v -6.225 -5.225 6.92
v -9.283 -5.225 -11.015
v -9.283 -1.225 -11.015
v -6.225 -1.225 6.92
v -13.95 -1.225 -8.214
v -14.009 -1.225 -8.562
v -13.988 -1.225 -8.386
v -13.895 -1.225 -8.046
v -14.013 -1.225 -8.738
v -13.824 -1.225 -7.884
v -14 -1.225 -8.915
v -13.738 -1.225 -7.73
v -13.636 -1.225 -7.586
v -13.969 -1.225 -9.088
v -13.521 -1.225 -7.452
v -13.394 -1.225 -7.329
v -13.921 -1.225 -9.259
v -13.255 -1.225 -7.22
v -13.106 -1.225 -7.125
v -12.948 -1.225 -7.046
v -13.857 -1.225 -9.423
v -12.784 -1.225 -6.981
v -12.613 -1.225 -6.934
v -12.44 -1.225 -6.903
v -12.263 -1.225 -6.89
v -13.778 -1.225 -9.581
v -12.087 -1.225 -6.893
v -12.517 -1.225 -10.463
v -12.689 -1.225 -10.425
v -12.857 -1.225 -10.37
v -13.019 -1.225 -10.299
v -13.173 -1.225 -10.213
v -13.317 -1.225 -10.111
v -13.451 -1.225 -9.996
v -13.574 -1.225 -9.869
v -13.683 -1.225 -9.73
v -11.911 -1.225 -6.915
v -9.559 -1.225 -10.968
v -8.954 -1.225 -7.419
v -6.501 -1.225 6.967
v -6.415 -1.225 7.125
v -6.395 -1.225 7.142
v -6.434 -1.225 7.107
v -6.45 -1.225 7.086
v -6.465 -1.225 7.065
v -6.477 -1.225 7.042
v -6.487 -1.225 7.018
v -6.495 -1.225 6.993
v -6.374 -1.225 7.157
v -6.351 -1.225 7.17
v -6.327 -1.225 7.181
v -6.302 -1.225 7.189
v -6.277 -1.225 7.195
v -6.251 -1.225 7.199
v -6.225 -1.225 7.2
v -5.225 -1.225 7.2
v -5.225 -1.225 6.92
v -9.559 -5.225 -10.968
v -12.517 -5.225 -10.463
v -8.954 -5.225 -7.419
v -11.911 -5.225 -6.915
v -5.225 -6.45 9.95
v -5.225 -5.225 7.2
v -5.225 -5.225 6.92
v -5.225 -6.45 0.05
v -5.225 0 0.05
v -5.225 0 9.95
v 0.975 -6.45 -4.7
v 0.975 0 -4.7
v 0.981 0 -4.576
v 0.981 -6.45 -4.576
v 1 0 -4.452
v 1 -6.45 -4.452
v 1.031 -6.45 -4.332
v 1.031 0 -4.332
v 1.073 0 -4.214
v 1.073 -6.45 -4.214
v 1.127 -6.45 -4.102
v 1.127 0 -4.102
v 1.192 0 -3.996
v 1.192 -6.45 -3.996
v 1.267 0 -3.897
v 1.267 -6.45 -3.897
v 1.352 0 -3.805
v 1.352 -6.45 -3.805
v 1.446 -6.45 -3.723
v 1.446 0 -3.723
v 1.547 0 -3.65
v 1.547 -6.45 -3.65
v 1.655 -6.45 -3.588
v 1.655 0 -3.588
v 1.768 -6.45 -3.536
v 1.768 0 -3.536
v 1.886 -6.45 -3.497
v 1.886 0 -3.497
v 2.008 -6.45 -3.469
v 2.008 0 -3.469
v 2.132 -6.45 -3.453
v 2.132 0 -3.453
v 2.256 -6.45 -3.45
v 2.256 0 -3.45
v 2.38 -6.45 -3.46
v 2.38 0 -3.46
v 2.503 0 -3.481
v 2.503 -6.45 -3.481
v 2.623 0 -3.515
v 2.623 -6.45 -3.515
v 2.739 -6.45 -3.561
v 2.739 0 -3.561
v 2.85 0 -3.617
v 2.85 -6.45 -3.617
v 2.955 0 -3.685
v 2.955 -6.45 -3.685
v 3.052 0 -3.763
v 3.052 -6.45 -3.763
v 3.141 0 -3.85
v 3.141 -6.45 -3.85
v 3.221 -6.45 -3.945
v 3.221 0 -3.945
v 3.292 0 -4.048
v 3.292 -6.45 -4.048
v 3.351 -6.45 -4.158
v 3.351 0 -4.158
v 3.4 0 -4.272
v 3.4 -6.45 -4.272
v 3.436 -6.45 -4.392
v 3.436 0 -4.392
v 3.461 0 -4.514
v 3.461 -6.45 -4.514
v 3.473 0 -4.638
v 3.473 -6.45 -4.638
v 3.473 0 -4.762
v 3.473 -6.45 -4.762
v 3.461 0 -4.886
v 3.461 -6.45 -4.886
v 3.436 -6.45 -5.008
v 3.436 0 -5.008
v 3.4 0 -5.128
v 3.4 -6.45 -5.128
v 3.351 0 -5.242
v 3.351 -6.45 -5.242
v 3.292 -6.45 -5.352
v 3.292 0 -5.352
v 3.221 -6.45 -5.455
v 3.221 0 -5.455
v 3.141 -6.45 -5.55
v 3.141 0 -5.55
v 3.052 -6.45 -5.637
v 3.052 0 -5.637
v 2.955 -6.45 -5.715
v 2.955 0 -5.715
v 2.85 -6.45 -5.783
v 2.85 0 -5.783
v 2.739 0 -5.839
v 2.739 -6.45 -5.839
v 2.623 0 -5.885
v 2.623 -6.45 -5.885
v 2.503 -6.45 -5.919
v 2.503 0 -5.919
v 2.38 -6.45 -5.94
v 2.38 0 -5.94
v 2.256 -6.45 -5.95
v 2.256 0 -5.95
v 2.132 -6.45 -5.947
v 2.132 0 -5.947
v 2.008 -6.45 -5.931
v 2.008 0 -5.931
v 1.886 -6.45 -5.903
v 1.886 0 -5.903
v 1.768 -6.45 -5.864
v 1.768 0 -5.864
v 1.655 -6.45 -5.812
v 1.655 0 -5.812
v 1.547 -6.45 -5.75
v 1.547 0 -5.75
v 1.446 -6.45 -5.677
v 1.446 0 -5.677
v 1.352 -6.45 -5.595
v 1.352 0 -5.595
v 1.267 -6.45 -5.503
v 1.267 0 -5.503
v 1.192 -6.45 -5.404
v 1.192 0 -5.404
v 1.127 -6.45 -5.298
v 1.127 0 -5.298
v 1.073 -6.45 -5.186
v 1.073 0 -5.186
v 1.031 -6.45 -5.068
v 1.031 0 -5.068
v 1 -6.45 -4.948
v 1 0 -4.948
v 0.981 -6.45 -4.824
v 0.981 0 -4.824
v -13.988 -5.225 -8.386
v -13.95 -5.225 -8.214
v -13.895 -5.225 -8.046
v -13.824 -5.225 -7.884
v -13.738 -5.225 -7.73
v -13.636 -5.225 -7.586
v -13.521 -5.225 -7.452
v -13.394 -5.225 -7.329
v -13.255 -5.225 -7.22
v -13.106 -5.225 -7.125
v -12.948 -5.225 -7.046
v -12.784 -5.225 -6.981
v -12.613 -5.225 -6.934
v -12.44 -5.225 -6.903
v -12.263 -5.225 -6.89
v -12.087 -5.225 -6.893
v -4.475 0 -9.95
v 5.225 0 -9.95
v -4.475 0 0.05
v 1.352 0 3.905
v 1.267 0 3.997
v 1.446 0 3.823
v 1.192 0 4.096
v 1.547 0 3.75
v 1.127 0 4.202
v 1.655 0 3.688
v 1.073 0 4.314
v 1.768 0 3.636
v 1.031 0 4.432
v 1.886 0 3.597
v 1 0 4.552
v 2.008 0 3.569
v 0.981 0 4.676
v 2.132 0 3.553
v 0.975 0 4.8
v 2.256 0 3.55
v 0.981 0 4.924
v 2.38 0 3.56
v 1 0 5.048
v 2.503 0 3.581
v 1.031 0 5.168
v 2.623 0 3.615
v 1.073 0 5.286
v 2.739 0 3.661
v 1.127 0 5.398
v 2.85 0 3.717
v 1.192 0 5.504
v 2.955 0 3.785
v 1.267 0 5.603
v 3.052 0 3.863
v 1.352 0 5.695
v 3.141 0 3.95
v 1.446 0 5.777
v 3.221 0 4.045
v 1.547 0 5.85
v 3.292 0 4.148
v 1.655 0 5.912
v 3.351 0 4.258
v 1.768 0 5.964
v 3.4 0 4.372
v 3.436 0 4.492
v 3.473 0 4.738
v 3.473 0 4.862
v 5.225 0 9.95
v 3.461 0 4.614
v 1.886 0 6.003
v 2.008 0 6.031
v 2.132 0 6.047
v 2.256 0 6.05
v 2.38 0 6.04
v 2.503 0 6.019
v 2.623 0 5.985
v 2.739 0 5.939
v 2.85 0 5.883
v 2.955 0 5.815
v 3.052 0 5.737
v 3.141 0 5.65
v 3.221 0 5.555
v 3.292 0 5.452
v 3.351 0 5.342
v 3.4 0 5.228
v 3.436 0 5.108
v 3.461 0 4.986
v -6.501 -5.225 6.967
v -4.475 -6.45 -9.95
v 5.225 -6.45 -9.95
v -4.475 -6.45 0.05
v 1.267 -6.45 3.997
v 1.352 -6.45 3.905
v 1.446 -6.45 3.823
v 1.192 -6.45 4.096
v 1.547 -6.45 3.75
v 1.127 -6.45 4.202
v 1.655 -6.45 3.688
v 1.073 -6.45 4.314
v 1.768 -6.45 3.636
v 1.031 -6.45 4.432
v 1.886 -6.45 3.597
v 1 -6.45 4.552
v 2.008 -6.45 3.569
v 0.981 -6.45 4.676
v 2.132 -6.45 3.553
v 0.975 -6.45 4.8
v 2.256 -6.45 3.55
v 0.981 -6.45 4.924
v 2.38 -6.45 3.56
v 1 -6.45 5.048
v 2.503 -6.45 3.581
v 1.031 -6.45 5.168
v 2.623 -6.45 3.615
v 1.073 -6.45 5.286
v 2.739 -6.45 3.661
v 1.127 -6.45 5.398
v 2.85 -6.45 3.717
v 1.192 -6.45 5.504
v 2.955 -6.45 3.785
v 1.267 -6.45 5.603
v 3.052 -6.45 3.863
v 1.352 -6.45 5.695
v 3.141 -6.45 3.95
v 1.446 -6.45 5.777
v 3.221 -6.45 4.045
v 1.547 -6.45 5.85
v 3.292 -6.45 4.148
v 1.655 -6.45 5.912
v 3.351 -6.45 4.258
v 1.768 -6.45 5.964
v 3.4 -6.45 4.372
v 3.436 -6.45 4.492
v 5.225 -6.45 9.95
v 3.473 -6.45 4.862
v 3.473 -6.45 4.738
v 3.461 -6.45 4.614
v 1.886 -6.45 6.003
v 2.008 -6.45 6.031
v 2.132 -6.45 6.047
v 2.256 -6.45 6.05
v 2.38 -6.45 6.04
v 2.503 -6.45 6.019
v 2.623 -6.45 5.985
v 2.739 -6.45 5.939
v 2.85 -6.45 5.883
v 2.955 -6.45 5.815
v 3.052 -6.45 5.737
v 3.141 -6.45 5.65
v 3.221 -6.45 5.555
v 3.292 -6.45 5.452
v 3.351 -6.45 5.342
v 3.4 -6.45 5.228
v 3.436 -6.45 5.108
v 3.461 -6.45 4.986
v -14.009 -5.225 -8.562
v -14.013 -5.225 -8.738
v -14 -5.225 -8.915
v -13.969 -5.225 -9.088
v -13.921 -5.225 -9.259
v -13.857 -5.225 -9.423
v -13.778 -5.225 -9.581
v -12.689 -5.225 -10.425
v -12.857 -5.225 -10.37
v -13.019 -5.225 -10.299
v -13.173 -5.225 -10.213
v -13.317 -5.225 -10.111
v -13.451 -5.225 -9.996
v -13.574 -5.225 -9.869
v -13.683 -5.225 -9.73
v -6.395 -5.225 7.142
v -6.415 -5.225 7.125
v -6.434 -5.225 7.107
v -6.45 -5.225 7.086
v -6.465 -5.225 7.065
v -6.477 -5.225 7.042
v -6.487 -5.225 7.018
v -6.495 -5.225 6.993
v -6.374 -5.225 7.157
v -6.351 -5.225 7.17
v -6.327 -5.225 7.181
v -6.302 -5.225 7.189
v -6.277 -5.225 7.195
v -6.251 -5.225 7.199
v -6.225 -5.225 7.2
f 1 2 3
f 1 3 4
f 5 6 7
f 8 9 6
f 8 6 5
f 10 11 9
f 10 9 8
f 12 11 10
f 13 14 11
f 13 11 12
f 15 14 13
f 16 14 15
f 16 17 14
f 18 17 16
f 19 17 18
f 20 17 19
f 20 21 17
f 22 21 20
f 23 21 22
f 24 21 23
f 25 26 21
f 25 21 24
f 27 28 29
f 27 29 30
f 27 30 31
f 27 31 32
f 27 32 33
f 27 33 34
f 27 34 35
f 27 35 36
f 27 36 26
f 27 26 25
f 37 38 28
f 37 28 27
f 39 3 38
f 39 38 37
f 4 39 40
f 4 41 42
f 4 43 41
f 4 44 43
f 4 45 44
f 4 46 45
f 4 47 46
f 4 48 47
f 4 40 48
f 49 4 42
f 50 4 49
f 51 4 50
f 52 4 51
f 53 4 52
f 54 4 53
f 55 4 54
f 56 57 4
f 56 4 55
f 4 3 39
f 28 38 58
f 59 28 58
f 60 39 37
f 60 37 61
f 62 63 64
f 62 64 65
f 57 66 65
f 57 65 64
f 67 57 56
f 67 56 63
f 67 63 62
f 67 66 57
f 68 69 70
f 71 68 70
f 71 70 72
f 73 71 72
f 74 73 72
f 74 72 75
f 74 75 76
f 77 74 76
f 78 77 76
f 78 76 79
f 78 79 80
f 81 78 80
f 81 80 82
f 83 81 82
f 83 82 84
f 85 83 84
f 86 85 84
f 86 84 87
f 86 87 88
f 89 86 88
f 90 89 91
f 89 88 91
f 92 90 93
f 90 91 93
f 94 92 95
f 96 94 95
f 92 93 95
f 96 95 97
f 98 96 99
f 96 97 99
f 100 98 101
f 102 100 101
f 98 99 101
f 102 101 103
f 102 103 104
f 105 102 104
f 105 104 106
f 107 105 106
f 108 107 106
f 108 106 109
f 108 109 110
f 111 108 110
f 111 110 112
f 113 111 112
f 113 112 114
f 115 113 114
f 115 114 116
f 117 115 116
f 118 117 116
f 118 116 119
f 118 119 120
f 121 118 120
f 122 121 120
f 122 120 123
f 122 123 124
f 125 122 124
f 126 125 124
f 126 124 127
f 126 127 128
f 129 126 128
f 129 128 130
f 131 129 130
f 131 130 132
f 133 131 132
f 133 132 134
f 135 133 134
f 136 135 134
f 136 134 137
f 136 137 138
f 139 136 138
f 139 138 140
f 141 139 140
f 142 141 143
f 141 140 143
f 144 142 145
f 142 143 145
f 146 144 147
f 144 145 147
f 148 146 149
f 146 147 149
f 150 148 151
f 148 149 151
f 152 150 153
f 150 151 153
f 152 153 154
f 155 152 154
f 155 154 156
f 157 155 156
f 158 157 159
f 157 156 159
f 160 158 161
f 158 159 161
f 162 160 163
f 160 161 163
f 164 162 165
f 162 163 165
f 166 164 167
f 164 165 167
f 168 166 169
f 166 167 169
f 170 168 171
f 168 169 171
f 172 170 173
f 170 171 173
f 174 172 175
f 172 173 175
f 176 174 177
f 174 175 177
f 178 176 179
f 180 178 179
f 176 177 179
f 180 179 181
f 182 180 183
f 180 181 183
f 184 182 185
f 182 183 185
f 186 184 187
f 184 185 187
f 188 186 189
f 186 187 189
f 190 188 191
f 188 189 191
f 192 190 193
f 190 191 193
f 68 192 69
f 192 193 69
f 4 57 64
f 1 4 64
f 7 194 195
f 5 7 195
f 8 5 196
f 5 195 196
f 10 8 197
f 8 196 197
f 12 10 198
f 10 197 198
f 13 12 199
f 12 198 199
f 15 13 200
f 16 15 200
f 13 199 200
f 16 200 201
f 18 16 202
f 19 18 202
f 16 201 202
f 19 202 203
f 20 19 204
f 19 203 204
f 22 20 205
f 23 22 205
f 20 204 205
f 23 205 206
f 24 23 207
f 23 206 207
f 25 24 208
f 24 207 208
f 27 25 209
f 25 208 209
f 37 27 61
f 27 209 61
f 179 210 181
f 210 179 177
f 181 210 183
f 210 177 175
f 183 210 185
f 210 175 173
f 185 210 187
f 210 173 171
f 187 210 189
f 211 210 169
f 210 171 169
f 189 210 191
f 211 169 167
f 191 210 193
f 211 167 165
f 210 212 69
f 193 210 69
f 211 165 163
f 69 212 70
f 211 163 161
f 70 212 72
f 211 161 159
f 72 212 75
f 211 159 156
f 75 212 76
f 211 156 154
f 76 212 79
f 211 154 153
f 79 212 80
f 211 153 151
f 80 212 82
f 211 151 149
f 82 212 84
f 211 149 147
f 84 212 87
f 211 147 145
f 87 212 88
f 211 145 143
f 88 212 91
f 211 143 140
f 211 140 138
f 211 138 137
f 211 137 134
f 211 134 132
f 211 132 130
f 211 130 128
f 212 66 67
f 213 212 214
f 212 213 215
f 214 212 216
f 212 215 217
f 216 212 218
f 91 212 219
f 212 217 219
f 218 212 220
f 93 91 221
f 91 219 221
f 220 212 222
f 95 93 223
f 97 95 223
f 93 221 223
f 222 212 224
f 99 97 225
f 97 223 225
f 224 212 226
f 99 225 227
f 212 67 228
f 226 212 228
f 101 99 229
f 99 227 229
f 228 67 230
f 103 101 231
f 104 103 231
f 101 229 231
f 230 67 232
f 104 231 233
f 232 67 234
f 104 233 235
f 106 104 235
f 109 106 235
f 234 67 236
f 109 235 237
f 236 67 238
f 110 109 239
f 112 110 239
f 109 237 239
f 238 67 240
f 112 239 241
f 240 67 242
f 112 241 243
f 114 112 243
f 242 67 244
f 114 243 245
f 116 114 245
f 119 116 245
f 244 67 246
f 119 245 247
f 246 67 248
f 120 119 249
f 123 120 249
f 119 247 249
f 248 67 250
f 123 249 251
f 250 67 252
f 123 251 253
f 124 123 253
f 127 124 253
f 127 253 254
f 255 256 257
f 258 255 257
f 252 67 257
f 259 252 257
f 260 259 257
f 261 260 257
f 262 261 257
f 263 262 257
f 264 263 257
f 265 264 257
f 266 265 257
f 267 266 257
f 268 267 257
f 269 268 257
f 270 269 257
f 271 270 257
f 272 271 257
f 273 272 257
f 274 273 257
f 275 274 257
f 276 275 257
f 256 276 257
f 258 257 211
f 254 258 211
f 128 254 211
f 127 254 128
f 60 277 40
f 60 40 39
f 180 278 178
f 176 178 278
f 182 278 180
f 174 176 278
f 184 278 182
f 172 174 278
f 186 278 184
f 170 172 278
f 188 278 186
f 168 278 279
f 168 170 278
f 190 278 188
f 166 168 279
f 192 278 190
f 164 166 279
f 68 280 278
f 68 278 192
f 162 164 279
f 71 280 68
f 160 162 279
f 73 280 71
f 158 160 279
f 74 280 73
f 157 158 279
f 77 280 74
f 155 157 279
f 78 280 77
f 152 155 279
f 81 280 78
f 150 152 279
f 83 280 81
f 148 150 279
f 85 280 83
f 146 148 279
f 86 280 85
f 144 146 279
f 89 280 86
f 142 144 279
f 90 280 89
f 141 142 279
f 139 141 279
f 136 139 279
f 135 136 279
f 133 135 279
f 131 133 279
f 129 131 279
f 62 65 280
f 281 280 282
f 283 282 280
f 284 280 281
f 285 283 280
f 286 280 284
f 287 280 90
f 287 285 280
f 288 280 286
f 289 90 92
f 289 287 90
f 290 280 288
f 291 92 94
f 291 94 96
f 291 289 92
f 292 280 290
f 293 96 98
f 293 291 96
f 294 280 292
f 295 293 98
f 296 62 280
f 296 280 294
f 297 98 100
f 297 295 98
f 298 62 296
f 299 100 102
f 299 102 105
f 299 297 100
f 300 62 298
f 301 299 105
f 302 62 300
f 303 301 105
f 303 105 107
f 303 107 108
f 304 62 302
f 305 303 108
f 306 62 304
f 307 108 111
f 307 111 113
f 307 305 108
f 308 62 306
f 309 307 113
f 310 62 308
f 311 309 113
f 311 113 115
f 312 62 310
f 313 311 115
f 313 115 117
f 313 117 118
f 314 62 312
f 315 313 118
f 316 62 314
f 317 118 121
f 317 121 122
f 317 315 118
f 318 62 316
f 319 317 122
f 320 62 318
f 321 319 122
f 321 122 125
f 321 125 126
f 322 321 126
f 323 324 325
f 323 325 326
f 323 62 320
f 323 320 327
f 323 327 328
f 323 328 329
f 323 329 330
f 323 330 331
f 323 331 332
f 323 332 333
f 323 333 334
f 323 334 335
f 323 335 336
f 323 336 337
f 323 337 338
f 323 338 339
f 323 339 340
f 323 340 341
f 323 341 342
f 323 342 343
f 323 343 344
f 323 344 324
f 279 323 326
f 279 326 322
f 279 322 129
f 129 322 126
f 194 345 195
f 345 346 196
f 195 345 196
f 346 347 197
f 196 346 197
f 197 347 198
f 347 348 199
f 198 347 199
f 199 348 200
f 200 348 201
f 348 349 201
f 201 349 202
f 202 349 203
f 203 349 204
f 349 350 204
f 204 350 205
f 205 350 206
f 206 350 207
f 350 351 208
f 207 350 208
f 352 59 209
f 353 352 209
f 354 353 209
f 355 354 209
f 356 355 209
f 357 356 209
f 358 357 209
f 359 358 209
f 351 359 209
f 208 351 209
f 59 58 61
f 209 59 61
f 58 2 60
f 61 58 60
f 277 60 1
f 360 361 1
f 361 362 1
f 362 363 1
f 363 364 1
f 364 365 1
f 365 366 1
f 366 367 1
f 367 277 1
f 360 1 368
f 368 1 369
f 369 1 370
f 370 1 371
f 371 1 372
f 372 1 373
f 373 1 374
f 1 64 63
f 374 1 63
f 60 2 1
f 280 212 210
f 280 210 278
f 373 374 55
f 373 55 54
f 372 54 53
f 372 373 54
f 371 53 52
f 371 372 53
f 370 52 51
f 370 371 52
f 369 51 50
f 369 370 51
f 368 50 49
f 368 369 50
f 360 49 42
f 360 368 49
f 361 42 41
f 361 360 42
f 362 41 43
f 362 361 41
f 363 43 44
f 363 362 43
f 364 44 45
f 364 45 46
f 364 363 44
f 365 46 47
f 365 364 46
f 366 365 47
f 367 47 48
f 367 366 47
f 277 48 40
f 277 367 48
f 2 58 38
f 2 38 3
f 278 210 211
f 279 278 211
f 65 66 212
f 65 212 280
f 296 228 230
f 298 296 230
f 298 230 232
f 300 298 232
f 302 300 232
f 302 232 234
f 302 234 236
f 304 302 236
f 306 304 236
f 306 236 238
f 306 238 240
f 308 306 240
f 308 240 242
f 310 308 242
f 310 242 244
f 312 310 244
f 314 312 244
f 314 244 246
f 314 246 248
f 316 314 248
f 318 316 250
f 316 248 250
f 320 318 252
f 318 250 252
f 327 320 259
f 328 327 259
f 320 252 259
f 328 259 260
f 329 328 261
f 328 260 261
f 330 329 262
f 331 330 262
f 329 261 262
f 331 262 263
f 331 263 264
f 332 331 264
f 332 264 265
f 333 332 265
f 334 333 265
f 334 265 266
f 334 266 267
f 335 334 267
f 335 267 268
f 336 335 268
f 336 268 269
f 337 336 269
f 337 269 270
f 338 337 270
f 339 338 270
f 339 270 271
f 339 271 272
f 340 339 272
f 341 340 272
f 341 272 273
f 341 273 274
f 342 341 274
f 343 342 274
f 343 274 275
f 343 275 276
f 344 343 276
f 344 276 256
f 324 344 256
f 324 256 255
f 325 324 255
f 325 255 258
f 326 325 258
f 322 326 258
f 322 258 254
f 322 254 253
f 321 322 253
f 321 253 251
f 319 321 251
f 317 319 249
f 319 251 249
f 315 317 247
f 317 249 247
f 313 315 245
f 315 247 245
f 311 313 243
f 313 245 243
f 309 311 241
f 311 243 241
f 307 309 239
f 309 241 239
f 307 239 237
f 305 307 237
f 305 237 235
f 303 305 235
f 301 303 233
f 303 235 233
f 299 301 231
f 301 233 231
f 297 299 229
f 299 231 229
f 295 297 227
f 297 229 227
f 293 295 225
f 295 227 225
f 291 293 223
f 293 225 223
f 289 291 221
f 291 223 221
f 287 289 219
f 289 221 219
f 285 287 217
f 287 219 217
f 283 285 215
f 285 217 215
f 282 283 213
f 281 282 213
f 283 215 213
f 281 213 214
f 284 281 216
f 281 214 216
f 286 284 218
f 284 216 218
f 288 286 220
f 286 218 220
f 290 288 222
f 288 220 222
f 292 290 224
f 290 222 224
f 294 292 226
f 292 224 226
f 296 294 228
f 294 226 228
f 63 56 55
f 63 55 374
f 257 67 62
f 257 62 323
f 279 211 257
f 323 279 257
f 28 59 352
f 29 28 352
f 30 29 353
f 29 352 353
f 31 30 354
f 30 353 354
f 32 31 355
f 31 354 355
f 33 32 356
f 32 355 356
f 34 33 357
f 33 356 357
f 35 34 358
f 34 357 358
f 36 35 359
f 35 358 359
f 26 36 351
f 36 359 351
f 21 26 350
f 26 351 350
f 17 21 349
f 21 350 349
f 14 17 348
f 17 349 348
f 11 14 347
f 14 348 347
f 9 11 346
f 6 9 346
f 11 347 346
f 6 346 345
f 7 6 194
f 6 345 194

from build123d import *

# Parameters (mm, degrees)
F0_W      = 10.45
F0_H      = 19.9
F1_DEPTH  = 6.45
F2_W      = 6.45
F2_H      = 10
F3_DEPTH  = 0.75
F4_W      = 4
F4_H      = 0.28
F5_DEPTH  = 1
F7_DEPTH  = 4
F8_W      = 4
F8_H      = 3.6
F9_DEPTH  = 4.8
F11_D     = 2.5
F13_DEPTH = 4


with BuildPart() as f1:
    # F0 (on Front) → F1 (new body)
    with BuildSketch(Plane.XZ):
        Rectangle(F0_W, F0_H)
    extrude(amount=F1_DEPTH)

    # F2 (on face) → F3 (cut)
    with BuildSketch(Plane(origin=(-5.225, 0, 0), x_dir=(0, -1, 0), z_dir=(-1, 0, 0))):
        with Locations((3.225, -4.95)):
            Rectangle(F2_W, F2_H)
    extrude(amount=-F3_DEPTH, mode=Mode.SUBTRACT)

    # F4 (on face) → F5 (join)
    with BuildSketch(Plane(origin=(-5.225, 0, 0), x_dir=(0, -1, 0), z_dir=(-1, 0, 0))):
        with Locations((3.225, 7.06)):
            Rectangle(F4_W, F4_H)
    extrude(amount=F5_DEPTH)

    # F6 (on face) → F7 (join)
    with BuildSketch(Plane.XZ.offset(5.225)):
        with BuildLine():
            Line((-9.2832269147, -11.0147129744), (-6.225, 6.92))
            Line((-6.225, 6.92), (-6.225, 7.2))
            ThreePointArc((-6.225, 7.2), (-6.4055844086, 7.1339842783), (-6.5010158882, 6.967066224))
            Line((-6.5010158882, 6.967066224), (-9.5592428029, -10.9676467504))
            Line((-9.5592428029, -10.9676467504), (-9.2832269147, -11.0147129744))
        make_face()
    extrude(amount=-F7_DEPTH)

    # F8 (on face) → F9 (join)
    with BuildSketch(Plane(origin=(-7.4717823939, 0, 1.2740881915), x_dir=(0, -1, 0), z_dir=(-0.9857710294, 0, 0.1680936572))):
        with Locations((3.225, -10.6184365097)):
            Rectangle(F8_W, F8_H)
    extrude(amount=F9_DEPTH)

    # F11 (through all)
    with Locations(Plane.XZ.offset(6.45)):
        with Locations((2.225, -4.7), (2.225, 4.8)):
            Hole(F11_D / 2)

    # F12 (on face) → F13 (cut, through all)
    with BuildSketch(Plane.XZ.offset(5.225)):
        with BuildLine():
            Line((-13.6858065784, -6.6120214902), (-13.9883751686, -8.3864093861))
            ThreePointArc((-13.9883751686, -8.3864093861), (-13.2547207126, -7.2203479586), (-11.9114187254, -6.9145900731))
            Line((-11.9114187254, -6.9145900731), (-13.6858065784, -6.6120214902))
        make_face()
        with BuildLine():
            Line((-13.9883751686, -8.3864093861), (-14.2909437441, -10.1607971961))
            Line((-14.2909437441, -10.1607971961), (-12.5165558912, -10.463365779))
            ThreePointArc((-12.5165558912, -10.463365779), (-13.6826172757, -9.7297113304), (-13.9883751686, -8.3864093861))
        make_face()
    extrude(amount=-F13_DEPTH, mode=Mode.SUBTRACT)


solid = f1.part
